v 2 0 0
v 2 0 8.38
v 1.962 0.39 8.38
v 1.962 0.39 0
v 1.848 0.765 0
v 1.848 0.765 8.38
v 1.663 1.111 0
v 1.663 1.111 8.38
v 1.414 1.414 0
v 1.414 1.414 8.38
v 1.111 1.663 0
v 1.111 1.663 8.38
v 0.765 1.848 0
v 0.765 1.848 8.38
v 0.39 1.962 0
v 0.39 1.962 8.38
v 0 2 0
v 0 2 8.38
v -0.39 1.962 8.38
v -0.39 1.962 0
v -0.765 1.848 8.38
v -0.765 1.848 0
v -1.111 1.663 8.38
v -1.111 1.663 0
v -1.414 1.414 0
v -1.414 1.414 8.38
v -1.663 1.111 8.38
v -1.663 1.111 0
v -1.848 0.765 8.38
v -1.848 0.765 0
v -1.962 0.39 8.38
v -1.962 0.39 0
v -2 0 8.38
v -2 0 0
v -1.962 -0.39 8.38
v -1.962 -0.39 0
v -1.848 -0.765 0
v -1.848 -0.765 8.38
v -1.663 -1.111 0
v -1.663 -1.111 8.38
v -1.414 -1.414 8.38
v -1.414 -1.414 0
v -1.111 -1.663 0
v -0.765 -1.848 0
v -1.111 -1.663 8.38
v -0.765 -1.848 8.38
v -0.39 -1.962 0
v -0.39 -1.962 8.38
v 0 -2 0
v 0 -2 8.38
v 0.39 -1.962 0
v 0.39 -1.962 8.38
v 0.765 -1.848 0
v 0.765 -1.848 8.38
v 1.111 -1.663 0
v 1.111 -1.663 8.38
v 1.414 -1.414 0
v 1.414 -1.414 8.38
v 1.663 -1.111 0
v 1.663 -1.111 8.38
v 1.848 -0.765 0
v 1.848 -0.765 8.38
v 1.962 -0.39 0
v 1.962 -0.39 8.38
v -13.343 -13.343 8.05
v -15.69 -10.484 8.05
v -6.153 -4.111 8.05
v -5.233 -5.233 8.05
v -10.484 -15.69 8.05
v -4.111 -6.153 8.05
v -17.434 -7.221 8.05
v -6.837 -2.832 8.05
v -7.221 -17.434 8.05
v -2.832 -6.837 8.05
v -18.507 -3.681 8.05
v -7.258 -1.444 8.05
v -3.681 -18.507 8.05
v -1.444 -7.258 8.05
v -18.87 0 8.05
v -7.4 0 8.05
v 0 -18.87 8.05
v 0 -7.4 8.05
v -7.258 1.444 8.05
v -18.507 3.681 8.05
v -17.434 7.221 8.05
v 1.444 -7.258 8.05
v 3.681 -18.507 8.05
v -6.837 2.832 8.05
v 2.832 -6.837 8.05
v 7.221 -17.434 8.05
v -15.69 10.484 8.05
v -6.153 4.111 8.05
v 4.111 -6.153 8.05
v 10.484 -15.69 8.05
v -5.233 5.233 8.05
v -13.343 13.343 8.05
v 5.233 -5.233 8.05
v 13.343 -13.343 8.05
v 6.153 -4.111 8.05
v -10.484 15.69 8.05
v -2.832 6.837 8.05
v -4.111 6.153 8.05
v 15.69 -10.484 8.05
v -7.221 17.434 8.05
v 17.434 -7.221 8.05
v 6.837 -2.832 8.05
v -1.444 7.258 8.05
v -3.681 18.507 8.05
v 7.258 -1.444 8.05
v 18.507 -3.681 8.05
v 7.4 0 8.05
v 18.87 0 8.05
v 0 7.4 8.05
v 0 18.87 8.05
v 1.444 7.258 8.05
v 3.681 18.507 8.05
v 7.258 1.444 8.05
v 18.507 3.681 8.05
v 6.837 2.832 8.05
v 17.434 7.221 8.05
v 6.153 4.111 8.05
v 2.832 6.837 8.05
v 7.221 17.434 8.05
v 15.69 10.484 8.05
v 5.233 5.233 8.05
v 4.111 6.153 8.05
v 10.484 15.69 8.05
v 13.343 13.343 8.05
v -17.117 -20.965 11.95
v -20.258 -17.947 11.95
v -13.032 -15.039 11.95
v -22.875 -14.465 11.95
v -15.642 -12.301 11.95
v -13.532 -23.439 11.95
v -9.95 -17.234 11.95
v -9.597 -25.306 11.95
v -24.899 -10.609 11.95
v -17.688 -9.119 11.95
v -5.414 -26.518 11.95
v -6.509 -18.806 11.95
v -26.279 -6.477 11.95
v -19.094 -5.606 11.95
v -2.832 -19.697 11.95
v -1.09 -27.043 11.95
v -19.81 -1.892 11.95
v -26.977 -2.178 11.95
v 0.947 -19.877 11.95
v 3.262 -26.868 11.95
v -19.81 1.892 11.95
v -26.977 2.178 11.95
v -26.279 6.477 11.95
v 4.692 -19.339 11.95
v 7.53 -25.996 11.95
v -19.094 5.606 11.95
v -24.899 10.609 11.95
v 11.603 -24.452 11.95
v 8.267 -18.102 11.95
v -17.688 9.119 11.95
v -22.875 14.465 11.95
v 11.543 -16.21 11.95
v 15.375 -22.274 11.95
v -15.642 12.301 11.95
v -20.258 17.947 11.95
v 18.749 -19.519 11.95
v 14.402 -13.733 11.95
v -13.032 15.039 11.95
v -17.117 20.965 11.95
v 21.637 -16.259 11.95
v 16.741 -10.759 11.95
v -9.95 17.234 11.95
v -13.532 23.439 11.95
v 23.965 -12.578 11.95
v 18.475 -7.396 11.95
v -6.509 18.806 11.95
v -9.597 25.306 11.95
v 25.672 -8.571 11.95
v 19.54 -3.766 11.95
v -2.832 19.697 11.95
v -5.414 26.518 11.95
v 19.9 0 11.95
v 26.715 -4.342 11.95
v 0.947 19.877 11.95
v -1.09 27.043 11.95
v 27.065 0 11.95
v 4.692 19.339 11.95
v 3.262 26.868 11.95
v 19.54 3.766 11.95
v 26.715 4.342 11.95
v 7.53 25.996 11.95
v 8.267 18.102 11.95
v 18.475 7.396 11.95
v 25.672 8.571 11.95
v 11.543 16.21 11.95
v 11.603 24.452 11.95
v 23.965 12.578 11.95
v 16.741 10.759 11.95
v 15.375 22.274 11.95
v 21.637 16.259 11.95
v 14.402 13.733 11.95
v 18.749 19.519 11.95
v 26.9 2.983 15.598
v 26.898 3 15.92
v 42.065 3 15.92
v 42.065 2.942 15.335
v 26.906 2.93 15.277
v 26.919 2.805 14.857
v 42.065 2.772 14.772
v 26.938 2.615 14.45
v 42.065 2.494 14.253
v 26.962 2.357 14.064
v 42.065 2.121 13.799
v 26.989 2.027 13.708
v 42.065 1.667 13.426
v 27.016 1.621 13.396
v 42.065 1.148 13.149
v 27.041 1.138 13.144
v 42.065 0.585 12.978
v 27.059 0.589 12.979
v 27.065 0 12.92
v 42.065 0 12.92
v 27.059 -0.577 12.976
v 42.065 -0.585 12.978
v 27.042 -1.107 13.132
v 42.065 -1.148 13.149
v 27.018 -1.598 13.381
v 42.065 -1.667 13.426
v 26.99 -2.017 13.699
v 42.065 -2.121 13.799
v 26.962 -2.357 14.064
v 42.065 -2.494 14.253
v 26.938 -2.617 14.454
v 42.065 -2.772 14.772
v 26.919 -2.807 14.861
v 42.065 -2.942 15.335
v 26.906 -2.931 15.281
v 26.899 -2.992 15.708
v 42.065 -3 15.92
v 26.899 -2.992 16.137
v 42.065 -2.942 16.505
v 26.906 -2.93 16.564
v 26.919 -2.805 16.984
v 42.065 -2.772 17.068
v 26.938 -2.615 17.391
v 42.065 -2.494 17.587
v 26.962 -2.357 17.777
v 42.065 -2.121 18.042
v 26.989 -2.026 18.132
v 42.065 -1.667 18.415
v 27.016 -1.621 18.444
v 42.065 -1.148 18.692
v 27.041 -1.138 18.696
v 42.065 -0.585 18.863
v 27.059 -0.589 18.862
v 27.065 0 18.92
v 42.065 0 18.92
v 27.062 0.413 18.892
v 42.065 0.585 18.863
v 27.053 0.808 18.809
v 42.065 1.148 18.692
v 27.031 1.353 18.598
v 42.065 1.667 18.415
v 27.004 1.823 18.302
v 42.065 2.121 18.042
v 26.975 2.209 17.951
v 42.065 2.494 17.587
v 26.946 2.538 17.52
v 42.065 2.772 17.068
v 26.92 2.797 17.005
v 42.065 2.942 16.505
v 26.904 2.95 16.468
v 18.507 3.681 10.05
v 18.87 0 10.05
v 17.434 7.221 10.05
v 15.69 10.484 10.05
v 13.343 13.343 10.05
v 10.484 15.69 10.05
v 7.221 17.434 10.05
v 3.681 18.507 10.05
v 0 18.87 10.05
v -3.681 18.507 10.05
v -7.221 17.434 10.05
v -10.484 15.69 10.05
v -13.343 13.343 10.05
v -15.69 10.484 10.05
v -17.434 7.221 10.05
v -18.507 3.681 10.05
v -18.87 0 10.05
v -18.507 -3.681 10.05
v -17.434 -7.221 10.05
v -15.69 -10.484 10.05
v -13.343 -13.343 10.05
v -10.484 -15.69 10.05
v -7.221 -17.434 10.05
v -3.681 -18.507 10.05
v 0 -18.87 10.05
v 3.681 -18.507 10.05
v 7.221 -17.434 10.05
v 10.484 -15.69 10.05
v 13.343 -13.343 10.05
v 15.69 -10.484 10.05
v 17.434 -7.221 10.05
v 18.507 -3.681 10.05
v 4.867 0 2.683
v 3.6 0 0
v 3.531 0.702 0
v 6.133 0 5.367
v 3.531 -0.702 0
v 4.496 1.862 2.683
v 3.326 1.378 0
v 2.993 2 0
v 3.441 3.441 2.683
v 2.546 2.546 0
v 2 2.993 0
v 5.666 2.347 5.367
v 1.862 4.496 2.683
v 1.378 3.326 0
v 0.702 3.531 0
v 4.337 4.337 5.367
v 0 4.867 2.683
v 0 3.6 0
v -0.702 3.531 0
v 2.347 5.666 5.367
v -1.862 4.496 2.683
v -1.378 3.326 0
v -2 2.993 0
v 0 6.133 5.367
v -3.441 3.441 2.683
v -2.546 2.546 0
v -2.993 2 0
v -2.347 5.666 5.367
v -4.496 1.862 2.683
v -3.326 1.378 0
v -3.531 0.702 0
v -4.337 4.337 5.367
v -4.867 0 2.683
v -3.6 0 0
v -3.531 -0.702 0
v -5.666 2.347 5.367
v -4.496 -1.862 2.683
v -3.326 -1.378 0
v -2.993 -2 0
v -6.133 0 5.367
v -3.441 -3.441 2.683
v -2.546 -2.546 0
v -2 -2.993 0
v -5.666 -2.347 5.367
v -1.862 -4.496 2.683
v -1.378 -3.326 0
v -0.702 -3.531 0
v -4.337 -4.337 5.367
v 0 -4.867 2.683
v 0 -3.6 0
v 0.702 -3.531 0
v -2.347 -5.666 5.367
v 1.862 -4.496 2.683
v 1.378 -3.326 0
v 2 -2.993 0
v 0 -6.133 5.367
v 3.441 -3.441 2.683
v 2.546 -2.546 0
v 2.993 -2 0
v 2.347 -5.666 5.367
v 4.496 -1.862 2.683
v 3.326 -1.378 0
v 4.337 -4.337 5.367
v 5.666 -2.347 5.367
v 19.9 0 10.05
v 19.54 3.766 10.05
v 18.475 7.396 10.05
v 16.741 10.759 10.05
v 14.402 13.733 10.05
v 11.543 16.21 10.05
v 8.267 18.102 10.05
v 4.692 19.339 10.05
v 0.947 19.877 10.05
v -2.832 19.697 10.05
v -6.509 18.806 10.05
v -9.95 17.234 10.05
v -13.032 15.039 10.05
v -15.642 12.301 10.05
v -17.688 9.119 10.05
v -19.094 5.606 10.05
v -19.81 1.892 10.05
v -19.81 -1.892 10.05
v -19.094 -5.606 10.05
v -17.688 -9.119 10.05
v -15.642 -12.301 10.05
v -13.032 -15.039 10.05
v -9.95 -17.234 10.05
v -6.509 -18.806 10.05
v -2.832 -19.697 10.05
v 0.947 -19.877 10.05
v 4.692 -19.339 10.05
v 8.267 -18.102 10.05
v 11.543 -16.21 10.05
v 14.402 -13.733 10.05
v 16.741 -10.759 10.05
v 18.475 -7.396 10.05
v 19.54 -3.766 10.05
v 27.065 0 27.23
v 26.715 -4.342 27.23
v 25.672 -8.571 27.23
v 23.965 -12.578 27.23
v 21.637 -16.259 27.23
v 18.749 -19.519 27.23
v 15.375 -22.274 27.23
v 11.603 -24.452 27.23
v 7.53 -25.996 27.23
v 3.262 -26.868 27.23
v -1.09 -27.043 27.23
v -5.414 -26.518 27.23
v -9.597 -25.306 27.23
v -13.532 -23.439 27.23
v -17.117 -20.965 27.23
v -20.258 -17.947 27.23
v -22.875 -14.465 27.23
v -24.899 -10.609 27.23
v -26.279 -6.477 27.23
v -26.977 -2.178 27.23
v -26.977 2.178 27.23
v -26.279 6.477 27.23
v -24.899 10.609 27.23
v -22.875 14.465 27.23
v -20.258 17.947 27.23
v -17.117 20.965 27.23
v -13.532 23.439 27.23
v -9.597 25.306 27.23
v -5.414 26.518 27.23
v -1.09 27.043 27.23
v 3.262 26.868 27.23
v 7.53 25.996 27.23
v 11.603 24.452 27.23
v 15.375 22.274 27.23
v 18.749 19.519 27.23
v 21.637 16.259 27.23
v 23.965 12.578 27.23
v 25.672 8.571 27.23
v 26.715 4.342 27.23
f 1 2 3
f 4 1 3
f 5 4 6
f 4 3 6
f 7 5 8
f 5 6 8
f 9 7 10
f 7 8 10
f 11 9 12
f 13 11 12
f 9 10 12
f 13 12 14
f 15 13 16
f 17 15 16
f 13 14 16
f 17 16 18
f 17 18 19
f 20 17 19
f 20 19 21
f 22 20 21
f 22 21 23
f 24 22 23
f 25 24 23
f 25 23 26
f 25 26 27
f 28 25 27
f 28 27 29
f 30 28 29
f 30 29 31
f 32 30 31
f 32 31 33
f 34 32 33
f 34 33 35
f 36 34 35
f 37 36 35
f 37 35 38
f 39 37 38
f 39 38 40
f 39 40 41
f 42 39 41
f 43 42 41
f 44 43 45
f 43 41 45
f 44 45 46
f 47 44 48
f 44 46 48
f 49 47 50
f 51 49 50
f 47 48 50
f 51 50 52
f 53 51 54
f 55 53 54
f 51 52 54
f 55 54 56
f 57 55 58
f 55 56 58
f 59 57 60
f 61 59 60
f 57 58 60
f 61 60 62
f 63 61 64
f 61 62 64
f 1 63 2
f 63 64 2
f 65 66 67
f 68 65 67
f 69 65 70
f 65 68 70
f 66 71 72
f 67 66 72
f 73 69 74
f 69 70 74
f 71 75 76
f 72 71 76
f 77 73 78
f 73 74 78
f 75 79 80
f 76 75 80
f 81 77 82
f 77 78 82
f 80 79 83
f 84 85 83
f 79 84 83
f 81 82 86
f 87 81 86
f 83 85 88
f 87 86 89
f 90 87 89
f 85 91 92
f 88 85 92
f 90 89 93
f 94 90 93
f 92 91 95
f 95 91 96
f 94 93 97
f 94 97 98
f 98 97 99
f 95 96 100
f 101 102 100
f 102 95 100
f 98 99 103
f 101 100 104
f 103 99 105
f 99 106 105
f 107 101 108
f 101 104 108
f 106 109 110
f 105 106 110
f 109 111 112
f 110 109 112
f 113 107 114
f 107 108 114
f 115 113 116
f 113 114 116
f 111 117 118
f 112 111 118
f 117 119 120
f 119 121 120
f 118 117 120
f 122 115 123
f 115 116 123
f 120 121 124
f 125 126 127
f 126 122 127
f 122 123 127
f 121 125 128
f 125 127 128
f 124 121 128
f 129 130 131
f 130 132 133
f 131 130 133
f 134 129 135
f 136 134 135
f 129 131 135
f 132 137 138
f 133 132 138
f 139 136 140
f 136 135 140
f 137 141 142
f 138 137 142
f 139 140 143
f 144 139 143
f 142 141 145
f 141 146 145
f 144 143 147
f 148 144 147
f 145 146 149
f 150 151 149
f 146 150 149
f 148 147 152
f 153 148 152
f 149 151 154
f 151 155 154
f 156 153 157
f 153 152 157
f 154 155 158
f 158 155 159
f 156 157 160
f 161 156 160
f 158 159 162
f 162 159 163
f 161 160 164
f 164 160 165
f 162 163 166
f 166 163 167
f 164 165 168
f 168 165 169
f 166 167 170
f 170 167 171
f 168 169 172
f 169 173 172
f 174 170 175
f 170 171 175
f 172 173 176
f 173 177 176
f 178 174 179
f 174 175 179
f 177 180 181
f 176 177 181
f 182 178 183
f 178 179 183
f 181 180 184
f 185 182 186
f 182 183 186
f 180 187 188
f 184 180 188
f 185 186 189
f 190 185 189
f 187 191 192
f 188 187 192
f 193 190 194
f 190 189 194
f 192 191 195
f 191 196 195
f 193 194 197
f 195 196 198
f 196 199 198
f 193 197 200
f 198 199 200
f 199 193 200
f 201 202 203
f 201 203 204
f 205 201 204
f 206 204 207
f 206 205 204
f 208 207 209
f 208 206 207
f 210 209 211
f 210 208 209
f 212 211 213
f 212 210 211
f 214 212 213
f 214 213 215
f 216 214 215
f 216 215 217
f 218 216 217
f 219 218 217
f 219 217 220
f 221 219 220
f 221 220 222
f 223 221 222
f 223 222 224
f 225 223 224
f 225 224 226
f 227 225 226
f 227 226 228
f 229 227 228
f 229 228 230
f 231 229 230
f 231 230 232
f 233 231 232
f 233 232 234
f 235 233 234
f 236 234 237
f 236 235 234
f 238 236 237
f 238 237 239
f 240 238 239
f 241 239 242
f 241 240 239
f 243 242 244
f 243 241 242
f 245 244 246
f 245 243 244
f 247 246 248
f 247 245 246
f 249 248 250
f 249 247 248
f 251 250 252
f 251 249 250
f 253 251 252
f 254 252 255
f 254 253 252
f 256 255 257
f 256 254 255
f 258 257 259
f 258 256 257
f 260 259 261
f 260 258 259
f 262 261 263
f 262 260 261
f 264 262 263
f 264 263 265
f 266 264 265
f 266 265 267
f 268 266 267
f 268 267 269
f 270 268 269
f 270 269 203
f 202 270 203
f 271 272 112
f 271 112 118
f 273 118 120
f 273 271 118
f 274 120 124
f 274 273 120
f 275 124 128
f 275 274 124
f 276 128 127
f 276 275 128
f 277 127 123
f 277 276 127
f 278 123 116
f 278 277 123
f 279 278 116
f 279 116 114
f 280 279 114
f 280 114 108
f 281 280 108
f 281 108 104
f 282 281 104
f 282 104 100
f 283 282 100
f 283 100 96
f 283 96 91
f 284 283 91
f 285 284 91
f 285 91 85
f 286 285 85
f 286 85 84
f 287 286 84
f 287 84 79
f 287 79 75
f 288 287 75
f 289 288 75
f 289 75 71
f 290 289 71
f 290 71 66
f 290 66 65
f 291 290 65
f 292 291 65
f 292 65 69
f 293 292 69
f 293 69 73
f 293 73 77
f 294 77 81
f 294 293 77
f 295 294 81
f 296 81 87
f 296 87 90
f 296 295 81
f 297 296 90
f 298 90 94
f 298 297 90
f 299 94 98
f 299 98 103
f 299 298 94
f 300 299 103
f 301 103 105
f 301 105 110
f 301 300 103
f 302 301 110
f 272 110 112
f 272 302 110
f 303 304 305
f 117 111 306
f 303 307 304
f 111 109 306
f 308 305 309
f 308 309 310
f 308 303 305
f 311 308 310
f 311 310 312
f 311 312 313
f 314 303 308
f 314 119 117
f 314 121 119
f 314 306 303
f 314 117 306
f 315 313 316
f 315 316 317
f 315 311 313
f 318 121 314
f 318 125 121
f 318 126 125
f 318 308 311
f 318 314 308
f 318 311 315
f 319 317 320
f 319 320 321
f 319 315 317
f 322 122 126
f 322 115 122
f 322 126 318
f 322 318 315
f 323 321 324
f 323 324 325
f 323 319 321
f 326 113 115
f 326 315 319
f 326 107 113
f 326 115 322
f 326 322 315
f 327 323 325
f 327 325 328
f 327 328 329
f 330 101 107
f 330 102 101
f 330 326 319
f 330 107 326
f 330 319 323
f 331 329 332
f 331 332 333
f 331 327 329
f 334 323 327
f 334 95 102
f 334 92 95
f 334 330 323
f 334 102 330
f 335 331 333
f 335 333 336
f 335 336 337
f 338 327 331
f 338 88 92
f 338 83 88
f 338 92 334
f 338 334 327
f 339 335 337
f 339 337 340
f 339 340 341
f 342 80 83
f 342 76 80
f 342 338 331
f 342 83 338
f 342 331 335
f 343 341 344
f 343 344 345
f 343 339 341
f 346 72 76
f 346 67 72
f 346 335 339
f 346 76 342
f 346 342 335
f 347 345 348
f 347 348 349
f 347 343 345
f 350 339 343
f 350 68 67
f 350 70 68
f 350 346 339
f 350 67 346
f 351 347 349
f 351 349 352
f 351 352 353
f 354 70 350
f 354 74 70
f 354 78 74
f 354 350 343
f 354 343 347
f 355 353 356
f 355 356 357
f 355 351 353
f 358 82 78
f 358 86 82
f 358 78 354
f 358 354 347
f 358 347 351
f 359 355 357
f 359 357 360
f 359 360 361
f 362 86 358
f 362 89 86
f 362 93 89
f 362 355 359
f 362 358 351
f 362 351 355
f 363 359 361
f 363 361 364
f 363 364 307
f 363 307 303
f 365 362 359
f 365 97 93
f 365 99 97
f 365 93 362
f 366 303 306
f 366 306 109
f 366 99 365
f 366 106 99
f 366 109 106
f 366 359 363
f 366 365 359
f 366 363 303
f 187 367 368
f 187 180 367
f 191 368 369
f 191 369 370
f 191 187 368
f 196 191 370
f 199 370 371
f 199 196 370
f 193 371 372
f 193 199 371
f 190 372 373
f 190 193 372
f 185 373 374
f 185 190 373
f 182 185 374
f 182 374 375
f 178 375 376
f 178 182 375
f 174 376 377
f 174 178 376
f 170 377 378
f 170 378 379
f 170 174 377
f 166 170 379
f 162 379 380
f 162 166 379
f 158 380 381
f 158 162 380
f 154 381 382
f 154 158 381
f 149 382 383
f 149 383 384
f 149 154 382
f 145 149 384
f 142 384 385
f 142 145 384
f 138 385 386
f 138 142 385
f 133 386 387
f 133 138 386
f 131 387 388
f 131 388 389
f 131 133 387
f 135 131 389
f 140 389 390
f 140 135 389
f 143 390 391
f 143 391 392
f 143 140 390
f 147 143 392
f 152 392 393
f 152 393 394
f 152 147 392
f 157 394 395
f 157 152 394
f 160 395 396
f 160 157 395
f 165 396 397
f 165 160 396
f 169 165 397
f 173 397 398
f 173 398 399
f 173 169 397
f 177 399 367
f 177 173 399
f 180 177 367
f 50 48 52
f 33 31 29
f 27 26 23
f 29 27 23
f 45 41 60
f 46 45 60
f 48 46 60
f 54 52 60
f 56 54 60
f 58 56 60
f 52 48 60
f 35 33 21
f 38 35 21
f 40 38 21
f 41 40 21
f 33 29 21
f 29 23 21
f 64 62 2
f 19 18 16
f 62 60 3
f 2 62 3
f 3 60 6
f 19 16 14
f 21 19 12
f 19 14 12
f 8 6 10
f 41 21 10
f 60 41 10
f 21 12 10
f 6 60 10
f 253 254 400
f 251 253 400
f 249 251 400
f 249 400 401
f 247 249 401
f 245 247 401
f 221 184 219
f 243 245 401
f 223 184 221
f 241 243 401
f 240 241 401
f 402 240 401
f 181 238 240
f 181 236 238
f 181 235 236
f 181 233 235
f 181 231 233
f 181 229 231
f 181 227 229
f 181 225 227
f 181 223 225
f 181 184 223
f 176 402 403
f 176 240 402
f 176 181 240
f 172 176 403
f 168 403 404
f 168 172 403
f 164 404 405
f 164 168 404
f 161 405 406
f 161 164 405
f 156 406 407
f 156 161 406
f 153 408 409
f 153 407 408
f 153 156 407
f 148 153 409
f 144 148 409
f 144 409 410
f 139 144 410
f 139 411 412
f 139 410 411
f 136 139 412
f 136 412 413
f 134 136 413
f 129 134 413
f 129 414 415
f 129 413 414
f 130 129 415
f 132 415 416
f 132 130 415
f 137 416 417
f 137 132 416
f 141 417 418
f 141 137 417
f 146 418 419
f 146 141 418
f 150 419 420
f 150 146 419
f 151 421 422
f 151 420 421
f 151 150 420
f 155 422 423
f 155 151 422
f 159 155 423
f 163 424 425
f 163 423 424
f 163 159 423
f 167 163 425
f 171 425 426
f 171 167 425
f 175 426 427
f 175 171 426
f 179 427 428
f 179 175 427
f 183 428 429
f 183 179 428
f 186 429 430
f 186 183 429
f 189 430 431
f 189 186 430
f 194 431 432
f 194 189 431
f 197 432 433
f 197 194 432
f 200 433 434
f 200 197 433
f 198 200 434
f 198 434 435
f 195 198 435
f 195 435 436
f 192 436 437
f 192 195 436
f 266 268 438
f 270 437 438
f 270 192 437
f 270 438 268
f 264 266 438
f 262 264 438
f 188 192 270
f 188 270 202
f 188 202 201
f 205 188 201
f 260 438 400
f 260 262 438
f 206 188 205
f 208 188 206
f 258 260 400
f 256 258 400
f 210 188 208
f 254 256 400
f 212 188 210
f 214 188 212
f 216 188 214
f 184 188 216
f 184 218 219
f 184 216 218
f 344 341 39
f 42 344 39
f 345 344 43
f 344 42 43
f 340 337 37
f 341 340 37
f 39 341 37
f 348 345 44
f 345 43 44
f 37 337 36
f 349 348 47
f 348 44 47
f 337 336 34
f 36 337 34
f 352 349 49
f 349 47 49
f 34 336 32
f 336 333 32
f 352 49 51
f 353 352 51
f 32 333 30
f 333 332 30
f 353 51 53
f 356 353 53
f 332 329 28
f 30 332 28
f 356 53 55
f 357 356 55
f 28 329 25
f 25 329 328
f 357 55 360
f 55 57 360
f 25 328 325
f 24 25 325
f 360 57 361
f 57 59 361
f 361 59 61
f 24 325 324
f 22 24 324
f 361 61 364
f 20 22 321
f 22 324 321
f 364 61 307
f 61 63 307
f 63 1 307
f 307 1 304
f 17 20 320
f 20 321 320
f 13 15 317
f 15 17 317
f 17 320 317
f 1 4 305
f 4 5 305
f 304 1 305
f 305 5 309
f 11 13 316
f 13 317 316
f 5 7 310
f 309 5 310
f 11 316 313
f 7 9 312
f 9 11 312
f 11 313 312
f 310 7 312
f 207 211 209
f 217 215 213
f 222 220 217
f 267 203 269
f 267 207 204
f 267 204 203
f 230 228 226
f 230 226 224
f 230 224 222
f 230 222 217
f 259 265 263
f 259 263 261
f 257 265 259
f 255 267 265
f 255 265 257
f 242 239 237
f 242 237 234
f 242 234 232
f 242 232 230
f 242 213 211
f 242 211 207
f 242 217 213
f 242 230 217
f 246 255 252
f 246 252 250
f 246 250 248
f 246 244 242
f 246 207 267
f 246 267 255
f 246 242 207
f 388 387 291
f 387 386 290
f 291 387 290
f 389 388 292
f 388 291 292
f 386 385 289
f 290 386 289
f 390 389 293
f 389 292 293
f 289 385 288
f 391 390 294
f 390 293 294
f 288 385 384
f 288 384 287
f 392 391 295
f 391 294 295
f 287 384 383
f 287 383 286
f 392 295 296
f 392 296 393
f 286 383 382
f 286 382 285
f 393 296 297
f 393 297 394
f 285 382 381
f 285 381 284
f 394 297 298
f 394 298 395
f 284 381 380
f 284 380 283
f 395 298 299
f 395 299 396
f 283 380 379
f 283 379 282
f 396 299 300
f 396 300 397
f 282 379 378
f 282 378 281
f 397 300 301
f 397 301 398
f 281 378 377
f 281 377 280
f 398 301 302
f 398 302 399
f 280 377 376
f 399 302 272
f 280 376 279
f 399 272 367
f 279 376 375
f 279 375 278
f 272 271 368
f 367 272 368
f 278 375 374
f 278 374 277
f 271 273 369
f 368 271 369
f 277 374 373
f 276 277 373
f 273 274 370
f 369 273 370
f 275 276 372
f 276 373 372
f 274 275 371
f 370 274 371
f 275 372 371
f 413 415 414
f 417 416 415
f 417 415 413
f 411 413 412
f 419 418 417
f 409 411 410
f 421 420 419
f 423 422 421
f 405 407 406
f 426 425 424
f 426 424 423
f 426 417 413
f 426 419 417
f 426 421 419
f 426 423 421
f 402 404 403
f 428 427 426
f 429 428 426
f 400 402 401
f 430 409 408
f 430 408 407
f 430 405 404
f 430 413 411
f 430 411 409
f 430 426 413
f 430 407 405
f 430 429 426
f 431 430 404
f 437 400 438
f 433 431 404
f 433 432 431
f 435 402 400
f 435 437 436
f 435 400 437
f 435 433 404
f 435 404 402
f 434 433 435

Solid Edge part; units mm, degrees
sketch "Sketch1" plane through (0, 0, 0) normal (0, -1, 0) x (1, 0, 0)
  line L0 (0, 27.23) -> (27.065, 27.23)
  line L1 (27.065, 27.23) -> (27.065, 11.95)
  line L2 (19.9, 11.95) -> (27.065, 11.95)
  line L3 (19.9, 10.05) -> (19.9, 11.95)
  line L4 (18.87, 10.05) -> (19.9, 10.05)
  line L5 (18.87, 8.05) -> (18.87, 10.05)
  line L6 (7.4, 8.05) -> (18.87, 8.05)
  line L7 (7.4, 8.05) -> (3.6, 0)
  line L8 (2, 0) -> (3.6, 0)
  line L9 (2, 0) -> (2, 8.38)
  line L10 (2, 8.38) -> (0, 8.38)
  line L11 (0, 8.38) -> (0, 27.23)
revolve "RevolvedProtrusion1" add sketch "Sketch1" angle 360 about axis through (0, 0, 8.38) along (0, 0, 1)
sketch "Sketch2" plane through (0, 0, 0) normal (1, 0, 0) x (0, 1, 0)
  circle A0 centre (0, 15.9202) radius 3
extrude "ExtrudedProtrusion_2" add sketch "Sketch2" along normal blind 42.065 and the other way blind 3.3012
